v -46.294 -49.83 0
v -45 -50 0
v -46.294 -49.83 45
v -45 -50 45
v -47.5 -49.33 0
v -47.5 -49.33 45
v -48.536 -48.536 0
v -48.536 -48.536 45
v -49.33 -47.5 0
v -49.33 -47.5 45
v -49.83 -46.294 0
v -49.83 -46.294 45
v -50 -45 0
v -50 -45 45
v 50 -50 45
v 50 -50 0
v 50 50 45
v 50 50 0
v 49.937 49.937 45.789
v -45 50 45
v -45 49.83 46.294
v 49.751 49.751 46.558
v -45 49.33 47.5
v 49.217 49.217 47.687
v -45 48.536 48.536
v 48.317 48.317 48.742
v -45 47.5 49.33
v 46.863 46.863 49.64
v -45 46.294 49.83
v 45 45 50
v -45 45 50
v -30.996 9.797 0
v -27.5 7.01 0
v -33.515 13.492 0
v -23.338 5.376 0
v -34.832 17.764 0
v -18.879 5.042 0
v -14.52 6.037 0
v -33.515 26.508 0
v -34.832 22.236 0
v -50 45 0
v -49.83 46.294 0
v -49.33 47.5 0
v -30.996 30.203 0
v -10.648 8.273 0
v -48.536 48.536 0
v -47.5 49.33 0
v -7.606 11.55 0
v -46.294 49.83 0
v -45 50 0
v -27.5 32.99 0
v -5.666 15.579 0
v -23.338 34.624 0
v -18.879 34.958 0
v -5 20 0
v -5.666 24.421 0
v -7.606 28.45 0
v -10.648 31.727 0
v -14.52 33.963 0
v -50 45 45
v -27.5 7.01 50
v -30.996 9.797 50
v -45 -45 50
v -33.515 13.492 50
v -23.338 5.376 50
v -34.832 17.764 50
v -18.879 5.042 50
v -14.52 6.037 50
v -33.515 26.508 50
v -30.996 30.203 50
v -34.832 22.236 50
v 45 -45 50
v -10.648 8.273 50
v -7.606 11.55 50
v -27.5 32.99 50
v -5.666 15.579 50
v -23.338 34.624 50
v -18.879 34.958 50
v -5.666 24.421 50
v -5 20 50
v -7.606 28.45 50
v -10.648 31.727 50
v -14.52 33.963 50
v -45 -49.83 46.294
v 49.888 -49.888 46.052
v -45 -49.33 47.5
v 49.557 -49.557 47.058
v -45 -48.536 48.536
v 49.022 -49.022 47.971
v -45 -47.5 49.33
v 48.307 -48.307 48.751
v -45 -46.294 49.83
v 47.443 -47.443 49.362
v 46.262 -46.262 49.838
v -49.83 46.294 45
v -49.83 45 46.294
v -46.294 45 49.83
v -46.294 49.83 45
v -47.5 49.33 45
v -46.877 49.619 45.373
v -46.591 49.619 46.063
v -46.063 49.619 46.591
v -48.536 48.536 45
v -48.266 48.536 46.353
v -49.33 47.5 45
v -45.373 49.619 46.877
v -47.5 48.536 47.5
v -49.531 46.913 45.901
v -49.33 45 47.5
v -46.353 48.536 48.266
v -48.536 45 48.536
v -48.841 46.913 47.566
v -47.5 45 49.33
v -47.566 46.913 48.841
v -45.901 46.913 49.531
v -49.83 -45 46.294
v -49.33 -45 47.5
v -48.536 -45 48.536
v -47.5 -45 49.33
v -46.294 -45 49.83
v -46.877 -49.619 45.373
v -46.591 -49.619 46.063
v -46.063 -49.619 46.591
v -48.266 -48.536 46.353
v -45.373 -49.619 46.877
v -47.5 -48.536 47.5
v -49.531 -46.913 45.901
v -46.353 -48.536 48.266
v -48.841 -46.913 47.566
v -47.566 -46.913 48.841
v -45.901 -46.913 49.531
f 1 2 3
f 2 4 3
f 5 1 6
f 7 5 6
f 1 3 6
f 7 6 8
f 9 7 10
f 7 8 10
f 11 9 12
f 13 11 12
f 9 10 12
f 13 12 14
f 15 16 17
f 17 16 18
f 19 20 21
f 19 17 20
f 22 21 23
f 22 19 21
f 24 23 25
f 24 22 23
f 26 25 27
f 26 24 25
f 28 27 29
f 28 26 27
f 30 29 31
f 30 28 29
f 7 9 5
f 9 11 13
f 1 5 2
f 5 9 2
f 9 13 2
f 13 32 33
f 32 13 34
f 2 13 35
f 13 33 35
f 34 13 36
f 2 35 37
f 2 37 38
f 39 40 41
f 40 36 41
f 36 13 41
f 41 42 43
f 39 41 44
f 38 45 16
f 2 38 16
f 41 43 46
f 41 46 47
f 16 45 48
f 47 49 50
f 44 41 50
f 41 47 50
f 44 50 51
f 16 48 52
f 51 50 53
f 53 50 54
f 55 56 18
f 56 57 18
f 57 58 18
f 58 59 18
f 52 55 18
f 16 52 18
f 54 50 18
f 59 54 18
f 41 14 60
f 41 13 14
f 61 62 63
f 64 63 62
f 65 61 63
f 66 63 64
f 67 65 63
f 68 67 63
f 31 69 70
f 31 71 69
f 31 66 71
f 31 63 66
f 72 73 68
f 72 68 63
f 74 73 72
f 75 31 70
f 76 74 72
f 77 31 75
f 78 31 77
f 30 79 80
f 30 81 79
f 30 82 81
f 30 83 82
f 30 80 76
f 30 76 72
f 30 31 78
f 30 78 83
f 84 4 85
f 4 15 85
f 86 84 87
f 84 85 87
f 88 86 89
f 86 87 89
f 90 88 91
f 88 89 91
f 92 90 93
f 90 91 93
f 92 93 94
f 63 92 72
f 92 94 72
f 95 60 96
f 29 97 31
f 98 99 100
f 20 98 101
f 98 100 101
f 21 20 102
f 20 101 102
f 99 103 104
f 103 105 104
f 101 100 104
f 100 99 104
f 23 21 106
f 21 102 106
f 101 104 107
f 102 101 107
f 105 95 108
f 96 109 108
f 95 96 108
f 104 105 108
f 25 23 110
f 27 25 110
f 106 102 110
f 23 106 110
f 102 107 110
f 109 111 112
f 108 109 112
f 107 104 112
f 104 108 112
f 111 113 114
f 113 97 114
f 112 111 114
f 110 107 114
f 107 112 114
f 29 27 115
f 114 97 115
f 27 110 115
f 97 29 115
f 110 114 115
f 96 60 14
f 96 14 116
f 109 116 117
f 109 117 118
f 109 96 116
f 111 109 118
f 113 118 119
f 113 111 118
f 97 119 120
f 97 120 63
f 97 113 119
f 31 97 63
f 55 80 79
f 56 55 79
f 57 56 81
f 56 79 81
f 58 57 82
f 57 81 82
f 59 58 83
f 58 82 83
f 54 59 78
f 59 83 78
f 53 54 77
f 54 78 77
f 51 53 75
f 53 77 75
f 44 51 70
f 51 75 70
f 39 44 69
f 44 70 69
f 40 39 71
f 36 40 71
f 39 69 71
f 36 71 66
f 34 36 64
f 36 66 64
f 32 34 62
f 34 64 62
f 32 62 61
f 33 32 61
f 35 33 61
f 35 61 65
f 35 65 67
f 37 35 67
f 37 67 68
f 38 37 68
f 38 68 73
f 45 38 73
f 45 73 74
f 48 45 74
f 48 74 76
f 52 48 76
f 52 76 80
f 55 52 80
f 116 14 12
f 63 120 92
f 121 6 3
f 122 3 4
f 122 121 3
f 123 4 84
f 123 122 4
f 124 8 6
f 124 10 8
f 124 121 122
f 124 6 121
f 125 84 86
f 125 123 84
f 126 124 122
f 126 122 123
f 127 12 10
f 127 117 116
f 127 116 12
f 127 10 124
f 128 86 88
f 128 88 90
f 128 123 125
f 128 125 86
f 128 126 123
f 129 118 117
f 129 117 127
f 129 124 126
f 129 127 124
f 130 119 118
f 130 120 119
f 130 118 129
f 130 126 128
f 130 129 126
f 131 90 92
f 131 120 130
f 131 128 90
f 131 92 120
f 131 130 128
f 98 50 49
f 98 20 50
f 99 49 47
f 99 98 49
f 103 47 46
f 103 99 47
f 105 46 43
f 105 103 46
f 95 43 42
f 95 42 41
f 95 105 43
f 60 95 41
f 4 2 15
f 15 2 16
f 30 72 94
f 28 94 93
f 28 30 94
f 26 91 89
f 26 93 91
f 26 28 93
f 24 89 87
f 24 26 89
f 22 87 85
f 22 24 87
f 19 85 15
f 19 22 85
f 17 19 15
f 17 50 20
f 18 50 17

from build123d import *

# Parameters (mm, degrees)
F0_W     = 100
F0_H     = 100
F1_DEPTH = 50
F2_R     = 15
F3_DEPTH = 50.001
F4_R     = 5
F5_R     = 5


with BuildPart() as f1:
    # F0 (on Top) → F1 (new body)
    with BuildSketch(Plane.XY):
        Rectangle(F0_W, F0_H)
    extrude(amount=F1_DEPTH)

    # F2 (on face) → F3 (cut, through all)
    with BuildSketch(Plane.XY.offset(50)):
        with Locations((-20, 20)):
            Circle(F2_R)
    extrude(amount=-F3_DEPTH, mode=Mode.SUBTRACT)

    # F4
    f4_edges = [f1.edges().sort_by_distance(p)[0] for p in [
        (-50, 0, 50),
    ]]
    fillet(f4_edges, radius=F4_R)

    # F5
    f5_edges = [f1.edges().sort_by_distance(p)[0] for p in [
        (2.5, -50, 50),
        (50, 0, 50),
        (2.5, 50, 50),
    ]]
    fillet(f5_edges, radius=F5_R)


solid = f1.part
